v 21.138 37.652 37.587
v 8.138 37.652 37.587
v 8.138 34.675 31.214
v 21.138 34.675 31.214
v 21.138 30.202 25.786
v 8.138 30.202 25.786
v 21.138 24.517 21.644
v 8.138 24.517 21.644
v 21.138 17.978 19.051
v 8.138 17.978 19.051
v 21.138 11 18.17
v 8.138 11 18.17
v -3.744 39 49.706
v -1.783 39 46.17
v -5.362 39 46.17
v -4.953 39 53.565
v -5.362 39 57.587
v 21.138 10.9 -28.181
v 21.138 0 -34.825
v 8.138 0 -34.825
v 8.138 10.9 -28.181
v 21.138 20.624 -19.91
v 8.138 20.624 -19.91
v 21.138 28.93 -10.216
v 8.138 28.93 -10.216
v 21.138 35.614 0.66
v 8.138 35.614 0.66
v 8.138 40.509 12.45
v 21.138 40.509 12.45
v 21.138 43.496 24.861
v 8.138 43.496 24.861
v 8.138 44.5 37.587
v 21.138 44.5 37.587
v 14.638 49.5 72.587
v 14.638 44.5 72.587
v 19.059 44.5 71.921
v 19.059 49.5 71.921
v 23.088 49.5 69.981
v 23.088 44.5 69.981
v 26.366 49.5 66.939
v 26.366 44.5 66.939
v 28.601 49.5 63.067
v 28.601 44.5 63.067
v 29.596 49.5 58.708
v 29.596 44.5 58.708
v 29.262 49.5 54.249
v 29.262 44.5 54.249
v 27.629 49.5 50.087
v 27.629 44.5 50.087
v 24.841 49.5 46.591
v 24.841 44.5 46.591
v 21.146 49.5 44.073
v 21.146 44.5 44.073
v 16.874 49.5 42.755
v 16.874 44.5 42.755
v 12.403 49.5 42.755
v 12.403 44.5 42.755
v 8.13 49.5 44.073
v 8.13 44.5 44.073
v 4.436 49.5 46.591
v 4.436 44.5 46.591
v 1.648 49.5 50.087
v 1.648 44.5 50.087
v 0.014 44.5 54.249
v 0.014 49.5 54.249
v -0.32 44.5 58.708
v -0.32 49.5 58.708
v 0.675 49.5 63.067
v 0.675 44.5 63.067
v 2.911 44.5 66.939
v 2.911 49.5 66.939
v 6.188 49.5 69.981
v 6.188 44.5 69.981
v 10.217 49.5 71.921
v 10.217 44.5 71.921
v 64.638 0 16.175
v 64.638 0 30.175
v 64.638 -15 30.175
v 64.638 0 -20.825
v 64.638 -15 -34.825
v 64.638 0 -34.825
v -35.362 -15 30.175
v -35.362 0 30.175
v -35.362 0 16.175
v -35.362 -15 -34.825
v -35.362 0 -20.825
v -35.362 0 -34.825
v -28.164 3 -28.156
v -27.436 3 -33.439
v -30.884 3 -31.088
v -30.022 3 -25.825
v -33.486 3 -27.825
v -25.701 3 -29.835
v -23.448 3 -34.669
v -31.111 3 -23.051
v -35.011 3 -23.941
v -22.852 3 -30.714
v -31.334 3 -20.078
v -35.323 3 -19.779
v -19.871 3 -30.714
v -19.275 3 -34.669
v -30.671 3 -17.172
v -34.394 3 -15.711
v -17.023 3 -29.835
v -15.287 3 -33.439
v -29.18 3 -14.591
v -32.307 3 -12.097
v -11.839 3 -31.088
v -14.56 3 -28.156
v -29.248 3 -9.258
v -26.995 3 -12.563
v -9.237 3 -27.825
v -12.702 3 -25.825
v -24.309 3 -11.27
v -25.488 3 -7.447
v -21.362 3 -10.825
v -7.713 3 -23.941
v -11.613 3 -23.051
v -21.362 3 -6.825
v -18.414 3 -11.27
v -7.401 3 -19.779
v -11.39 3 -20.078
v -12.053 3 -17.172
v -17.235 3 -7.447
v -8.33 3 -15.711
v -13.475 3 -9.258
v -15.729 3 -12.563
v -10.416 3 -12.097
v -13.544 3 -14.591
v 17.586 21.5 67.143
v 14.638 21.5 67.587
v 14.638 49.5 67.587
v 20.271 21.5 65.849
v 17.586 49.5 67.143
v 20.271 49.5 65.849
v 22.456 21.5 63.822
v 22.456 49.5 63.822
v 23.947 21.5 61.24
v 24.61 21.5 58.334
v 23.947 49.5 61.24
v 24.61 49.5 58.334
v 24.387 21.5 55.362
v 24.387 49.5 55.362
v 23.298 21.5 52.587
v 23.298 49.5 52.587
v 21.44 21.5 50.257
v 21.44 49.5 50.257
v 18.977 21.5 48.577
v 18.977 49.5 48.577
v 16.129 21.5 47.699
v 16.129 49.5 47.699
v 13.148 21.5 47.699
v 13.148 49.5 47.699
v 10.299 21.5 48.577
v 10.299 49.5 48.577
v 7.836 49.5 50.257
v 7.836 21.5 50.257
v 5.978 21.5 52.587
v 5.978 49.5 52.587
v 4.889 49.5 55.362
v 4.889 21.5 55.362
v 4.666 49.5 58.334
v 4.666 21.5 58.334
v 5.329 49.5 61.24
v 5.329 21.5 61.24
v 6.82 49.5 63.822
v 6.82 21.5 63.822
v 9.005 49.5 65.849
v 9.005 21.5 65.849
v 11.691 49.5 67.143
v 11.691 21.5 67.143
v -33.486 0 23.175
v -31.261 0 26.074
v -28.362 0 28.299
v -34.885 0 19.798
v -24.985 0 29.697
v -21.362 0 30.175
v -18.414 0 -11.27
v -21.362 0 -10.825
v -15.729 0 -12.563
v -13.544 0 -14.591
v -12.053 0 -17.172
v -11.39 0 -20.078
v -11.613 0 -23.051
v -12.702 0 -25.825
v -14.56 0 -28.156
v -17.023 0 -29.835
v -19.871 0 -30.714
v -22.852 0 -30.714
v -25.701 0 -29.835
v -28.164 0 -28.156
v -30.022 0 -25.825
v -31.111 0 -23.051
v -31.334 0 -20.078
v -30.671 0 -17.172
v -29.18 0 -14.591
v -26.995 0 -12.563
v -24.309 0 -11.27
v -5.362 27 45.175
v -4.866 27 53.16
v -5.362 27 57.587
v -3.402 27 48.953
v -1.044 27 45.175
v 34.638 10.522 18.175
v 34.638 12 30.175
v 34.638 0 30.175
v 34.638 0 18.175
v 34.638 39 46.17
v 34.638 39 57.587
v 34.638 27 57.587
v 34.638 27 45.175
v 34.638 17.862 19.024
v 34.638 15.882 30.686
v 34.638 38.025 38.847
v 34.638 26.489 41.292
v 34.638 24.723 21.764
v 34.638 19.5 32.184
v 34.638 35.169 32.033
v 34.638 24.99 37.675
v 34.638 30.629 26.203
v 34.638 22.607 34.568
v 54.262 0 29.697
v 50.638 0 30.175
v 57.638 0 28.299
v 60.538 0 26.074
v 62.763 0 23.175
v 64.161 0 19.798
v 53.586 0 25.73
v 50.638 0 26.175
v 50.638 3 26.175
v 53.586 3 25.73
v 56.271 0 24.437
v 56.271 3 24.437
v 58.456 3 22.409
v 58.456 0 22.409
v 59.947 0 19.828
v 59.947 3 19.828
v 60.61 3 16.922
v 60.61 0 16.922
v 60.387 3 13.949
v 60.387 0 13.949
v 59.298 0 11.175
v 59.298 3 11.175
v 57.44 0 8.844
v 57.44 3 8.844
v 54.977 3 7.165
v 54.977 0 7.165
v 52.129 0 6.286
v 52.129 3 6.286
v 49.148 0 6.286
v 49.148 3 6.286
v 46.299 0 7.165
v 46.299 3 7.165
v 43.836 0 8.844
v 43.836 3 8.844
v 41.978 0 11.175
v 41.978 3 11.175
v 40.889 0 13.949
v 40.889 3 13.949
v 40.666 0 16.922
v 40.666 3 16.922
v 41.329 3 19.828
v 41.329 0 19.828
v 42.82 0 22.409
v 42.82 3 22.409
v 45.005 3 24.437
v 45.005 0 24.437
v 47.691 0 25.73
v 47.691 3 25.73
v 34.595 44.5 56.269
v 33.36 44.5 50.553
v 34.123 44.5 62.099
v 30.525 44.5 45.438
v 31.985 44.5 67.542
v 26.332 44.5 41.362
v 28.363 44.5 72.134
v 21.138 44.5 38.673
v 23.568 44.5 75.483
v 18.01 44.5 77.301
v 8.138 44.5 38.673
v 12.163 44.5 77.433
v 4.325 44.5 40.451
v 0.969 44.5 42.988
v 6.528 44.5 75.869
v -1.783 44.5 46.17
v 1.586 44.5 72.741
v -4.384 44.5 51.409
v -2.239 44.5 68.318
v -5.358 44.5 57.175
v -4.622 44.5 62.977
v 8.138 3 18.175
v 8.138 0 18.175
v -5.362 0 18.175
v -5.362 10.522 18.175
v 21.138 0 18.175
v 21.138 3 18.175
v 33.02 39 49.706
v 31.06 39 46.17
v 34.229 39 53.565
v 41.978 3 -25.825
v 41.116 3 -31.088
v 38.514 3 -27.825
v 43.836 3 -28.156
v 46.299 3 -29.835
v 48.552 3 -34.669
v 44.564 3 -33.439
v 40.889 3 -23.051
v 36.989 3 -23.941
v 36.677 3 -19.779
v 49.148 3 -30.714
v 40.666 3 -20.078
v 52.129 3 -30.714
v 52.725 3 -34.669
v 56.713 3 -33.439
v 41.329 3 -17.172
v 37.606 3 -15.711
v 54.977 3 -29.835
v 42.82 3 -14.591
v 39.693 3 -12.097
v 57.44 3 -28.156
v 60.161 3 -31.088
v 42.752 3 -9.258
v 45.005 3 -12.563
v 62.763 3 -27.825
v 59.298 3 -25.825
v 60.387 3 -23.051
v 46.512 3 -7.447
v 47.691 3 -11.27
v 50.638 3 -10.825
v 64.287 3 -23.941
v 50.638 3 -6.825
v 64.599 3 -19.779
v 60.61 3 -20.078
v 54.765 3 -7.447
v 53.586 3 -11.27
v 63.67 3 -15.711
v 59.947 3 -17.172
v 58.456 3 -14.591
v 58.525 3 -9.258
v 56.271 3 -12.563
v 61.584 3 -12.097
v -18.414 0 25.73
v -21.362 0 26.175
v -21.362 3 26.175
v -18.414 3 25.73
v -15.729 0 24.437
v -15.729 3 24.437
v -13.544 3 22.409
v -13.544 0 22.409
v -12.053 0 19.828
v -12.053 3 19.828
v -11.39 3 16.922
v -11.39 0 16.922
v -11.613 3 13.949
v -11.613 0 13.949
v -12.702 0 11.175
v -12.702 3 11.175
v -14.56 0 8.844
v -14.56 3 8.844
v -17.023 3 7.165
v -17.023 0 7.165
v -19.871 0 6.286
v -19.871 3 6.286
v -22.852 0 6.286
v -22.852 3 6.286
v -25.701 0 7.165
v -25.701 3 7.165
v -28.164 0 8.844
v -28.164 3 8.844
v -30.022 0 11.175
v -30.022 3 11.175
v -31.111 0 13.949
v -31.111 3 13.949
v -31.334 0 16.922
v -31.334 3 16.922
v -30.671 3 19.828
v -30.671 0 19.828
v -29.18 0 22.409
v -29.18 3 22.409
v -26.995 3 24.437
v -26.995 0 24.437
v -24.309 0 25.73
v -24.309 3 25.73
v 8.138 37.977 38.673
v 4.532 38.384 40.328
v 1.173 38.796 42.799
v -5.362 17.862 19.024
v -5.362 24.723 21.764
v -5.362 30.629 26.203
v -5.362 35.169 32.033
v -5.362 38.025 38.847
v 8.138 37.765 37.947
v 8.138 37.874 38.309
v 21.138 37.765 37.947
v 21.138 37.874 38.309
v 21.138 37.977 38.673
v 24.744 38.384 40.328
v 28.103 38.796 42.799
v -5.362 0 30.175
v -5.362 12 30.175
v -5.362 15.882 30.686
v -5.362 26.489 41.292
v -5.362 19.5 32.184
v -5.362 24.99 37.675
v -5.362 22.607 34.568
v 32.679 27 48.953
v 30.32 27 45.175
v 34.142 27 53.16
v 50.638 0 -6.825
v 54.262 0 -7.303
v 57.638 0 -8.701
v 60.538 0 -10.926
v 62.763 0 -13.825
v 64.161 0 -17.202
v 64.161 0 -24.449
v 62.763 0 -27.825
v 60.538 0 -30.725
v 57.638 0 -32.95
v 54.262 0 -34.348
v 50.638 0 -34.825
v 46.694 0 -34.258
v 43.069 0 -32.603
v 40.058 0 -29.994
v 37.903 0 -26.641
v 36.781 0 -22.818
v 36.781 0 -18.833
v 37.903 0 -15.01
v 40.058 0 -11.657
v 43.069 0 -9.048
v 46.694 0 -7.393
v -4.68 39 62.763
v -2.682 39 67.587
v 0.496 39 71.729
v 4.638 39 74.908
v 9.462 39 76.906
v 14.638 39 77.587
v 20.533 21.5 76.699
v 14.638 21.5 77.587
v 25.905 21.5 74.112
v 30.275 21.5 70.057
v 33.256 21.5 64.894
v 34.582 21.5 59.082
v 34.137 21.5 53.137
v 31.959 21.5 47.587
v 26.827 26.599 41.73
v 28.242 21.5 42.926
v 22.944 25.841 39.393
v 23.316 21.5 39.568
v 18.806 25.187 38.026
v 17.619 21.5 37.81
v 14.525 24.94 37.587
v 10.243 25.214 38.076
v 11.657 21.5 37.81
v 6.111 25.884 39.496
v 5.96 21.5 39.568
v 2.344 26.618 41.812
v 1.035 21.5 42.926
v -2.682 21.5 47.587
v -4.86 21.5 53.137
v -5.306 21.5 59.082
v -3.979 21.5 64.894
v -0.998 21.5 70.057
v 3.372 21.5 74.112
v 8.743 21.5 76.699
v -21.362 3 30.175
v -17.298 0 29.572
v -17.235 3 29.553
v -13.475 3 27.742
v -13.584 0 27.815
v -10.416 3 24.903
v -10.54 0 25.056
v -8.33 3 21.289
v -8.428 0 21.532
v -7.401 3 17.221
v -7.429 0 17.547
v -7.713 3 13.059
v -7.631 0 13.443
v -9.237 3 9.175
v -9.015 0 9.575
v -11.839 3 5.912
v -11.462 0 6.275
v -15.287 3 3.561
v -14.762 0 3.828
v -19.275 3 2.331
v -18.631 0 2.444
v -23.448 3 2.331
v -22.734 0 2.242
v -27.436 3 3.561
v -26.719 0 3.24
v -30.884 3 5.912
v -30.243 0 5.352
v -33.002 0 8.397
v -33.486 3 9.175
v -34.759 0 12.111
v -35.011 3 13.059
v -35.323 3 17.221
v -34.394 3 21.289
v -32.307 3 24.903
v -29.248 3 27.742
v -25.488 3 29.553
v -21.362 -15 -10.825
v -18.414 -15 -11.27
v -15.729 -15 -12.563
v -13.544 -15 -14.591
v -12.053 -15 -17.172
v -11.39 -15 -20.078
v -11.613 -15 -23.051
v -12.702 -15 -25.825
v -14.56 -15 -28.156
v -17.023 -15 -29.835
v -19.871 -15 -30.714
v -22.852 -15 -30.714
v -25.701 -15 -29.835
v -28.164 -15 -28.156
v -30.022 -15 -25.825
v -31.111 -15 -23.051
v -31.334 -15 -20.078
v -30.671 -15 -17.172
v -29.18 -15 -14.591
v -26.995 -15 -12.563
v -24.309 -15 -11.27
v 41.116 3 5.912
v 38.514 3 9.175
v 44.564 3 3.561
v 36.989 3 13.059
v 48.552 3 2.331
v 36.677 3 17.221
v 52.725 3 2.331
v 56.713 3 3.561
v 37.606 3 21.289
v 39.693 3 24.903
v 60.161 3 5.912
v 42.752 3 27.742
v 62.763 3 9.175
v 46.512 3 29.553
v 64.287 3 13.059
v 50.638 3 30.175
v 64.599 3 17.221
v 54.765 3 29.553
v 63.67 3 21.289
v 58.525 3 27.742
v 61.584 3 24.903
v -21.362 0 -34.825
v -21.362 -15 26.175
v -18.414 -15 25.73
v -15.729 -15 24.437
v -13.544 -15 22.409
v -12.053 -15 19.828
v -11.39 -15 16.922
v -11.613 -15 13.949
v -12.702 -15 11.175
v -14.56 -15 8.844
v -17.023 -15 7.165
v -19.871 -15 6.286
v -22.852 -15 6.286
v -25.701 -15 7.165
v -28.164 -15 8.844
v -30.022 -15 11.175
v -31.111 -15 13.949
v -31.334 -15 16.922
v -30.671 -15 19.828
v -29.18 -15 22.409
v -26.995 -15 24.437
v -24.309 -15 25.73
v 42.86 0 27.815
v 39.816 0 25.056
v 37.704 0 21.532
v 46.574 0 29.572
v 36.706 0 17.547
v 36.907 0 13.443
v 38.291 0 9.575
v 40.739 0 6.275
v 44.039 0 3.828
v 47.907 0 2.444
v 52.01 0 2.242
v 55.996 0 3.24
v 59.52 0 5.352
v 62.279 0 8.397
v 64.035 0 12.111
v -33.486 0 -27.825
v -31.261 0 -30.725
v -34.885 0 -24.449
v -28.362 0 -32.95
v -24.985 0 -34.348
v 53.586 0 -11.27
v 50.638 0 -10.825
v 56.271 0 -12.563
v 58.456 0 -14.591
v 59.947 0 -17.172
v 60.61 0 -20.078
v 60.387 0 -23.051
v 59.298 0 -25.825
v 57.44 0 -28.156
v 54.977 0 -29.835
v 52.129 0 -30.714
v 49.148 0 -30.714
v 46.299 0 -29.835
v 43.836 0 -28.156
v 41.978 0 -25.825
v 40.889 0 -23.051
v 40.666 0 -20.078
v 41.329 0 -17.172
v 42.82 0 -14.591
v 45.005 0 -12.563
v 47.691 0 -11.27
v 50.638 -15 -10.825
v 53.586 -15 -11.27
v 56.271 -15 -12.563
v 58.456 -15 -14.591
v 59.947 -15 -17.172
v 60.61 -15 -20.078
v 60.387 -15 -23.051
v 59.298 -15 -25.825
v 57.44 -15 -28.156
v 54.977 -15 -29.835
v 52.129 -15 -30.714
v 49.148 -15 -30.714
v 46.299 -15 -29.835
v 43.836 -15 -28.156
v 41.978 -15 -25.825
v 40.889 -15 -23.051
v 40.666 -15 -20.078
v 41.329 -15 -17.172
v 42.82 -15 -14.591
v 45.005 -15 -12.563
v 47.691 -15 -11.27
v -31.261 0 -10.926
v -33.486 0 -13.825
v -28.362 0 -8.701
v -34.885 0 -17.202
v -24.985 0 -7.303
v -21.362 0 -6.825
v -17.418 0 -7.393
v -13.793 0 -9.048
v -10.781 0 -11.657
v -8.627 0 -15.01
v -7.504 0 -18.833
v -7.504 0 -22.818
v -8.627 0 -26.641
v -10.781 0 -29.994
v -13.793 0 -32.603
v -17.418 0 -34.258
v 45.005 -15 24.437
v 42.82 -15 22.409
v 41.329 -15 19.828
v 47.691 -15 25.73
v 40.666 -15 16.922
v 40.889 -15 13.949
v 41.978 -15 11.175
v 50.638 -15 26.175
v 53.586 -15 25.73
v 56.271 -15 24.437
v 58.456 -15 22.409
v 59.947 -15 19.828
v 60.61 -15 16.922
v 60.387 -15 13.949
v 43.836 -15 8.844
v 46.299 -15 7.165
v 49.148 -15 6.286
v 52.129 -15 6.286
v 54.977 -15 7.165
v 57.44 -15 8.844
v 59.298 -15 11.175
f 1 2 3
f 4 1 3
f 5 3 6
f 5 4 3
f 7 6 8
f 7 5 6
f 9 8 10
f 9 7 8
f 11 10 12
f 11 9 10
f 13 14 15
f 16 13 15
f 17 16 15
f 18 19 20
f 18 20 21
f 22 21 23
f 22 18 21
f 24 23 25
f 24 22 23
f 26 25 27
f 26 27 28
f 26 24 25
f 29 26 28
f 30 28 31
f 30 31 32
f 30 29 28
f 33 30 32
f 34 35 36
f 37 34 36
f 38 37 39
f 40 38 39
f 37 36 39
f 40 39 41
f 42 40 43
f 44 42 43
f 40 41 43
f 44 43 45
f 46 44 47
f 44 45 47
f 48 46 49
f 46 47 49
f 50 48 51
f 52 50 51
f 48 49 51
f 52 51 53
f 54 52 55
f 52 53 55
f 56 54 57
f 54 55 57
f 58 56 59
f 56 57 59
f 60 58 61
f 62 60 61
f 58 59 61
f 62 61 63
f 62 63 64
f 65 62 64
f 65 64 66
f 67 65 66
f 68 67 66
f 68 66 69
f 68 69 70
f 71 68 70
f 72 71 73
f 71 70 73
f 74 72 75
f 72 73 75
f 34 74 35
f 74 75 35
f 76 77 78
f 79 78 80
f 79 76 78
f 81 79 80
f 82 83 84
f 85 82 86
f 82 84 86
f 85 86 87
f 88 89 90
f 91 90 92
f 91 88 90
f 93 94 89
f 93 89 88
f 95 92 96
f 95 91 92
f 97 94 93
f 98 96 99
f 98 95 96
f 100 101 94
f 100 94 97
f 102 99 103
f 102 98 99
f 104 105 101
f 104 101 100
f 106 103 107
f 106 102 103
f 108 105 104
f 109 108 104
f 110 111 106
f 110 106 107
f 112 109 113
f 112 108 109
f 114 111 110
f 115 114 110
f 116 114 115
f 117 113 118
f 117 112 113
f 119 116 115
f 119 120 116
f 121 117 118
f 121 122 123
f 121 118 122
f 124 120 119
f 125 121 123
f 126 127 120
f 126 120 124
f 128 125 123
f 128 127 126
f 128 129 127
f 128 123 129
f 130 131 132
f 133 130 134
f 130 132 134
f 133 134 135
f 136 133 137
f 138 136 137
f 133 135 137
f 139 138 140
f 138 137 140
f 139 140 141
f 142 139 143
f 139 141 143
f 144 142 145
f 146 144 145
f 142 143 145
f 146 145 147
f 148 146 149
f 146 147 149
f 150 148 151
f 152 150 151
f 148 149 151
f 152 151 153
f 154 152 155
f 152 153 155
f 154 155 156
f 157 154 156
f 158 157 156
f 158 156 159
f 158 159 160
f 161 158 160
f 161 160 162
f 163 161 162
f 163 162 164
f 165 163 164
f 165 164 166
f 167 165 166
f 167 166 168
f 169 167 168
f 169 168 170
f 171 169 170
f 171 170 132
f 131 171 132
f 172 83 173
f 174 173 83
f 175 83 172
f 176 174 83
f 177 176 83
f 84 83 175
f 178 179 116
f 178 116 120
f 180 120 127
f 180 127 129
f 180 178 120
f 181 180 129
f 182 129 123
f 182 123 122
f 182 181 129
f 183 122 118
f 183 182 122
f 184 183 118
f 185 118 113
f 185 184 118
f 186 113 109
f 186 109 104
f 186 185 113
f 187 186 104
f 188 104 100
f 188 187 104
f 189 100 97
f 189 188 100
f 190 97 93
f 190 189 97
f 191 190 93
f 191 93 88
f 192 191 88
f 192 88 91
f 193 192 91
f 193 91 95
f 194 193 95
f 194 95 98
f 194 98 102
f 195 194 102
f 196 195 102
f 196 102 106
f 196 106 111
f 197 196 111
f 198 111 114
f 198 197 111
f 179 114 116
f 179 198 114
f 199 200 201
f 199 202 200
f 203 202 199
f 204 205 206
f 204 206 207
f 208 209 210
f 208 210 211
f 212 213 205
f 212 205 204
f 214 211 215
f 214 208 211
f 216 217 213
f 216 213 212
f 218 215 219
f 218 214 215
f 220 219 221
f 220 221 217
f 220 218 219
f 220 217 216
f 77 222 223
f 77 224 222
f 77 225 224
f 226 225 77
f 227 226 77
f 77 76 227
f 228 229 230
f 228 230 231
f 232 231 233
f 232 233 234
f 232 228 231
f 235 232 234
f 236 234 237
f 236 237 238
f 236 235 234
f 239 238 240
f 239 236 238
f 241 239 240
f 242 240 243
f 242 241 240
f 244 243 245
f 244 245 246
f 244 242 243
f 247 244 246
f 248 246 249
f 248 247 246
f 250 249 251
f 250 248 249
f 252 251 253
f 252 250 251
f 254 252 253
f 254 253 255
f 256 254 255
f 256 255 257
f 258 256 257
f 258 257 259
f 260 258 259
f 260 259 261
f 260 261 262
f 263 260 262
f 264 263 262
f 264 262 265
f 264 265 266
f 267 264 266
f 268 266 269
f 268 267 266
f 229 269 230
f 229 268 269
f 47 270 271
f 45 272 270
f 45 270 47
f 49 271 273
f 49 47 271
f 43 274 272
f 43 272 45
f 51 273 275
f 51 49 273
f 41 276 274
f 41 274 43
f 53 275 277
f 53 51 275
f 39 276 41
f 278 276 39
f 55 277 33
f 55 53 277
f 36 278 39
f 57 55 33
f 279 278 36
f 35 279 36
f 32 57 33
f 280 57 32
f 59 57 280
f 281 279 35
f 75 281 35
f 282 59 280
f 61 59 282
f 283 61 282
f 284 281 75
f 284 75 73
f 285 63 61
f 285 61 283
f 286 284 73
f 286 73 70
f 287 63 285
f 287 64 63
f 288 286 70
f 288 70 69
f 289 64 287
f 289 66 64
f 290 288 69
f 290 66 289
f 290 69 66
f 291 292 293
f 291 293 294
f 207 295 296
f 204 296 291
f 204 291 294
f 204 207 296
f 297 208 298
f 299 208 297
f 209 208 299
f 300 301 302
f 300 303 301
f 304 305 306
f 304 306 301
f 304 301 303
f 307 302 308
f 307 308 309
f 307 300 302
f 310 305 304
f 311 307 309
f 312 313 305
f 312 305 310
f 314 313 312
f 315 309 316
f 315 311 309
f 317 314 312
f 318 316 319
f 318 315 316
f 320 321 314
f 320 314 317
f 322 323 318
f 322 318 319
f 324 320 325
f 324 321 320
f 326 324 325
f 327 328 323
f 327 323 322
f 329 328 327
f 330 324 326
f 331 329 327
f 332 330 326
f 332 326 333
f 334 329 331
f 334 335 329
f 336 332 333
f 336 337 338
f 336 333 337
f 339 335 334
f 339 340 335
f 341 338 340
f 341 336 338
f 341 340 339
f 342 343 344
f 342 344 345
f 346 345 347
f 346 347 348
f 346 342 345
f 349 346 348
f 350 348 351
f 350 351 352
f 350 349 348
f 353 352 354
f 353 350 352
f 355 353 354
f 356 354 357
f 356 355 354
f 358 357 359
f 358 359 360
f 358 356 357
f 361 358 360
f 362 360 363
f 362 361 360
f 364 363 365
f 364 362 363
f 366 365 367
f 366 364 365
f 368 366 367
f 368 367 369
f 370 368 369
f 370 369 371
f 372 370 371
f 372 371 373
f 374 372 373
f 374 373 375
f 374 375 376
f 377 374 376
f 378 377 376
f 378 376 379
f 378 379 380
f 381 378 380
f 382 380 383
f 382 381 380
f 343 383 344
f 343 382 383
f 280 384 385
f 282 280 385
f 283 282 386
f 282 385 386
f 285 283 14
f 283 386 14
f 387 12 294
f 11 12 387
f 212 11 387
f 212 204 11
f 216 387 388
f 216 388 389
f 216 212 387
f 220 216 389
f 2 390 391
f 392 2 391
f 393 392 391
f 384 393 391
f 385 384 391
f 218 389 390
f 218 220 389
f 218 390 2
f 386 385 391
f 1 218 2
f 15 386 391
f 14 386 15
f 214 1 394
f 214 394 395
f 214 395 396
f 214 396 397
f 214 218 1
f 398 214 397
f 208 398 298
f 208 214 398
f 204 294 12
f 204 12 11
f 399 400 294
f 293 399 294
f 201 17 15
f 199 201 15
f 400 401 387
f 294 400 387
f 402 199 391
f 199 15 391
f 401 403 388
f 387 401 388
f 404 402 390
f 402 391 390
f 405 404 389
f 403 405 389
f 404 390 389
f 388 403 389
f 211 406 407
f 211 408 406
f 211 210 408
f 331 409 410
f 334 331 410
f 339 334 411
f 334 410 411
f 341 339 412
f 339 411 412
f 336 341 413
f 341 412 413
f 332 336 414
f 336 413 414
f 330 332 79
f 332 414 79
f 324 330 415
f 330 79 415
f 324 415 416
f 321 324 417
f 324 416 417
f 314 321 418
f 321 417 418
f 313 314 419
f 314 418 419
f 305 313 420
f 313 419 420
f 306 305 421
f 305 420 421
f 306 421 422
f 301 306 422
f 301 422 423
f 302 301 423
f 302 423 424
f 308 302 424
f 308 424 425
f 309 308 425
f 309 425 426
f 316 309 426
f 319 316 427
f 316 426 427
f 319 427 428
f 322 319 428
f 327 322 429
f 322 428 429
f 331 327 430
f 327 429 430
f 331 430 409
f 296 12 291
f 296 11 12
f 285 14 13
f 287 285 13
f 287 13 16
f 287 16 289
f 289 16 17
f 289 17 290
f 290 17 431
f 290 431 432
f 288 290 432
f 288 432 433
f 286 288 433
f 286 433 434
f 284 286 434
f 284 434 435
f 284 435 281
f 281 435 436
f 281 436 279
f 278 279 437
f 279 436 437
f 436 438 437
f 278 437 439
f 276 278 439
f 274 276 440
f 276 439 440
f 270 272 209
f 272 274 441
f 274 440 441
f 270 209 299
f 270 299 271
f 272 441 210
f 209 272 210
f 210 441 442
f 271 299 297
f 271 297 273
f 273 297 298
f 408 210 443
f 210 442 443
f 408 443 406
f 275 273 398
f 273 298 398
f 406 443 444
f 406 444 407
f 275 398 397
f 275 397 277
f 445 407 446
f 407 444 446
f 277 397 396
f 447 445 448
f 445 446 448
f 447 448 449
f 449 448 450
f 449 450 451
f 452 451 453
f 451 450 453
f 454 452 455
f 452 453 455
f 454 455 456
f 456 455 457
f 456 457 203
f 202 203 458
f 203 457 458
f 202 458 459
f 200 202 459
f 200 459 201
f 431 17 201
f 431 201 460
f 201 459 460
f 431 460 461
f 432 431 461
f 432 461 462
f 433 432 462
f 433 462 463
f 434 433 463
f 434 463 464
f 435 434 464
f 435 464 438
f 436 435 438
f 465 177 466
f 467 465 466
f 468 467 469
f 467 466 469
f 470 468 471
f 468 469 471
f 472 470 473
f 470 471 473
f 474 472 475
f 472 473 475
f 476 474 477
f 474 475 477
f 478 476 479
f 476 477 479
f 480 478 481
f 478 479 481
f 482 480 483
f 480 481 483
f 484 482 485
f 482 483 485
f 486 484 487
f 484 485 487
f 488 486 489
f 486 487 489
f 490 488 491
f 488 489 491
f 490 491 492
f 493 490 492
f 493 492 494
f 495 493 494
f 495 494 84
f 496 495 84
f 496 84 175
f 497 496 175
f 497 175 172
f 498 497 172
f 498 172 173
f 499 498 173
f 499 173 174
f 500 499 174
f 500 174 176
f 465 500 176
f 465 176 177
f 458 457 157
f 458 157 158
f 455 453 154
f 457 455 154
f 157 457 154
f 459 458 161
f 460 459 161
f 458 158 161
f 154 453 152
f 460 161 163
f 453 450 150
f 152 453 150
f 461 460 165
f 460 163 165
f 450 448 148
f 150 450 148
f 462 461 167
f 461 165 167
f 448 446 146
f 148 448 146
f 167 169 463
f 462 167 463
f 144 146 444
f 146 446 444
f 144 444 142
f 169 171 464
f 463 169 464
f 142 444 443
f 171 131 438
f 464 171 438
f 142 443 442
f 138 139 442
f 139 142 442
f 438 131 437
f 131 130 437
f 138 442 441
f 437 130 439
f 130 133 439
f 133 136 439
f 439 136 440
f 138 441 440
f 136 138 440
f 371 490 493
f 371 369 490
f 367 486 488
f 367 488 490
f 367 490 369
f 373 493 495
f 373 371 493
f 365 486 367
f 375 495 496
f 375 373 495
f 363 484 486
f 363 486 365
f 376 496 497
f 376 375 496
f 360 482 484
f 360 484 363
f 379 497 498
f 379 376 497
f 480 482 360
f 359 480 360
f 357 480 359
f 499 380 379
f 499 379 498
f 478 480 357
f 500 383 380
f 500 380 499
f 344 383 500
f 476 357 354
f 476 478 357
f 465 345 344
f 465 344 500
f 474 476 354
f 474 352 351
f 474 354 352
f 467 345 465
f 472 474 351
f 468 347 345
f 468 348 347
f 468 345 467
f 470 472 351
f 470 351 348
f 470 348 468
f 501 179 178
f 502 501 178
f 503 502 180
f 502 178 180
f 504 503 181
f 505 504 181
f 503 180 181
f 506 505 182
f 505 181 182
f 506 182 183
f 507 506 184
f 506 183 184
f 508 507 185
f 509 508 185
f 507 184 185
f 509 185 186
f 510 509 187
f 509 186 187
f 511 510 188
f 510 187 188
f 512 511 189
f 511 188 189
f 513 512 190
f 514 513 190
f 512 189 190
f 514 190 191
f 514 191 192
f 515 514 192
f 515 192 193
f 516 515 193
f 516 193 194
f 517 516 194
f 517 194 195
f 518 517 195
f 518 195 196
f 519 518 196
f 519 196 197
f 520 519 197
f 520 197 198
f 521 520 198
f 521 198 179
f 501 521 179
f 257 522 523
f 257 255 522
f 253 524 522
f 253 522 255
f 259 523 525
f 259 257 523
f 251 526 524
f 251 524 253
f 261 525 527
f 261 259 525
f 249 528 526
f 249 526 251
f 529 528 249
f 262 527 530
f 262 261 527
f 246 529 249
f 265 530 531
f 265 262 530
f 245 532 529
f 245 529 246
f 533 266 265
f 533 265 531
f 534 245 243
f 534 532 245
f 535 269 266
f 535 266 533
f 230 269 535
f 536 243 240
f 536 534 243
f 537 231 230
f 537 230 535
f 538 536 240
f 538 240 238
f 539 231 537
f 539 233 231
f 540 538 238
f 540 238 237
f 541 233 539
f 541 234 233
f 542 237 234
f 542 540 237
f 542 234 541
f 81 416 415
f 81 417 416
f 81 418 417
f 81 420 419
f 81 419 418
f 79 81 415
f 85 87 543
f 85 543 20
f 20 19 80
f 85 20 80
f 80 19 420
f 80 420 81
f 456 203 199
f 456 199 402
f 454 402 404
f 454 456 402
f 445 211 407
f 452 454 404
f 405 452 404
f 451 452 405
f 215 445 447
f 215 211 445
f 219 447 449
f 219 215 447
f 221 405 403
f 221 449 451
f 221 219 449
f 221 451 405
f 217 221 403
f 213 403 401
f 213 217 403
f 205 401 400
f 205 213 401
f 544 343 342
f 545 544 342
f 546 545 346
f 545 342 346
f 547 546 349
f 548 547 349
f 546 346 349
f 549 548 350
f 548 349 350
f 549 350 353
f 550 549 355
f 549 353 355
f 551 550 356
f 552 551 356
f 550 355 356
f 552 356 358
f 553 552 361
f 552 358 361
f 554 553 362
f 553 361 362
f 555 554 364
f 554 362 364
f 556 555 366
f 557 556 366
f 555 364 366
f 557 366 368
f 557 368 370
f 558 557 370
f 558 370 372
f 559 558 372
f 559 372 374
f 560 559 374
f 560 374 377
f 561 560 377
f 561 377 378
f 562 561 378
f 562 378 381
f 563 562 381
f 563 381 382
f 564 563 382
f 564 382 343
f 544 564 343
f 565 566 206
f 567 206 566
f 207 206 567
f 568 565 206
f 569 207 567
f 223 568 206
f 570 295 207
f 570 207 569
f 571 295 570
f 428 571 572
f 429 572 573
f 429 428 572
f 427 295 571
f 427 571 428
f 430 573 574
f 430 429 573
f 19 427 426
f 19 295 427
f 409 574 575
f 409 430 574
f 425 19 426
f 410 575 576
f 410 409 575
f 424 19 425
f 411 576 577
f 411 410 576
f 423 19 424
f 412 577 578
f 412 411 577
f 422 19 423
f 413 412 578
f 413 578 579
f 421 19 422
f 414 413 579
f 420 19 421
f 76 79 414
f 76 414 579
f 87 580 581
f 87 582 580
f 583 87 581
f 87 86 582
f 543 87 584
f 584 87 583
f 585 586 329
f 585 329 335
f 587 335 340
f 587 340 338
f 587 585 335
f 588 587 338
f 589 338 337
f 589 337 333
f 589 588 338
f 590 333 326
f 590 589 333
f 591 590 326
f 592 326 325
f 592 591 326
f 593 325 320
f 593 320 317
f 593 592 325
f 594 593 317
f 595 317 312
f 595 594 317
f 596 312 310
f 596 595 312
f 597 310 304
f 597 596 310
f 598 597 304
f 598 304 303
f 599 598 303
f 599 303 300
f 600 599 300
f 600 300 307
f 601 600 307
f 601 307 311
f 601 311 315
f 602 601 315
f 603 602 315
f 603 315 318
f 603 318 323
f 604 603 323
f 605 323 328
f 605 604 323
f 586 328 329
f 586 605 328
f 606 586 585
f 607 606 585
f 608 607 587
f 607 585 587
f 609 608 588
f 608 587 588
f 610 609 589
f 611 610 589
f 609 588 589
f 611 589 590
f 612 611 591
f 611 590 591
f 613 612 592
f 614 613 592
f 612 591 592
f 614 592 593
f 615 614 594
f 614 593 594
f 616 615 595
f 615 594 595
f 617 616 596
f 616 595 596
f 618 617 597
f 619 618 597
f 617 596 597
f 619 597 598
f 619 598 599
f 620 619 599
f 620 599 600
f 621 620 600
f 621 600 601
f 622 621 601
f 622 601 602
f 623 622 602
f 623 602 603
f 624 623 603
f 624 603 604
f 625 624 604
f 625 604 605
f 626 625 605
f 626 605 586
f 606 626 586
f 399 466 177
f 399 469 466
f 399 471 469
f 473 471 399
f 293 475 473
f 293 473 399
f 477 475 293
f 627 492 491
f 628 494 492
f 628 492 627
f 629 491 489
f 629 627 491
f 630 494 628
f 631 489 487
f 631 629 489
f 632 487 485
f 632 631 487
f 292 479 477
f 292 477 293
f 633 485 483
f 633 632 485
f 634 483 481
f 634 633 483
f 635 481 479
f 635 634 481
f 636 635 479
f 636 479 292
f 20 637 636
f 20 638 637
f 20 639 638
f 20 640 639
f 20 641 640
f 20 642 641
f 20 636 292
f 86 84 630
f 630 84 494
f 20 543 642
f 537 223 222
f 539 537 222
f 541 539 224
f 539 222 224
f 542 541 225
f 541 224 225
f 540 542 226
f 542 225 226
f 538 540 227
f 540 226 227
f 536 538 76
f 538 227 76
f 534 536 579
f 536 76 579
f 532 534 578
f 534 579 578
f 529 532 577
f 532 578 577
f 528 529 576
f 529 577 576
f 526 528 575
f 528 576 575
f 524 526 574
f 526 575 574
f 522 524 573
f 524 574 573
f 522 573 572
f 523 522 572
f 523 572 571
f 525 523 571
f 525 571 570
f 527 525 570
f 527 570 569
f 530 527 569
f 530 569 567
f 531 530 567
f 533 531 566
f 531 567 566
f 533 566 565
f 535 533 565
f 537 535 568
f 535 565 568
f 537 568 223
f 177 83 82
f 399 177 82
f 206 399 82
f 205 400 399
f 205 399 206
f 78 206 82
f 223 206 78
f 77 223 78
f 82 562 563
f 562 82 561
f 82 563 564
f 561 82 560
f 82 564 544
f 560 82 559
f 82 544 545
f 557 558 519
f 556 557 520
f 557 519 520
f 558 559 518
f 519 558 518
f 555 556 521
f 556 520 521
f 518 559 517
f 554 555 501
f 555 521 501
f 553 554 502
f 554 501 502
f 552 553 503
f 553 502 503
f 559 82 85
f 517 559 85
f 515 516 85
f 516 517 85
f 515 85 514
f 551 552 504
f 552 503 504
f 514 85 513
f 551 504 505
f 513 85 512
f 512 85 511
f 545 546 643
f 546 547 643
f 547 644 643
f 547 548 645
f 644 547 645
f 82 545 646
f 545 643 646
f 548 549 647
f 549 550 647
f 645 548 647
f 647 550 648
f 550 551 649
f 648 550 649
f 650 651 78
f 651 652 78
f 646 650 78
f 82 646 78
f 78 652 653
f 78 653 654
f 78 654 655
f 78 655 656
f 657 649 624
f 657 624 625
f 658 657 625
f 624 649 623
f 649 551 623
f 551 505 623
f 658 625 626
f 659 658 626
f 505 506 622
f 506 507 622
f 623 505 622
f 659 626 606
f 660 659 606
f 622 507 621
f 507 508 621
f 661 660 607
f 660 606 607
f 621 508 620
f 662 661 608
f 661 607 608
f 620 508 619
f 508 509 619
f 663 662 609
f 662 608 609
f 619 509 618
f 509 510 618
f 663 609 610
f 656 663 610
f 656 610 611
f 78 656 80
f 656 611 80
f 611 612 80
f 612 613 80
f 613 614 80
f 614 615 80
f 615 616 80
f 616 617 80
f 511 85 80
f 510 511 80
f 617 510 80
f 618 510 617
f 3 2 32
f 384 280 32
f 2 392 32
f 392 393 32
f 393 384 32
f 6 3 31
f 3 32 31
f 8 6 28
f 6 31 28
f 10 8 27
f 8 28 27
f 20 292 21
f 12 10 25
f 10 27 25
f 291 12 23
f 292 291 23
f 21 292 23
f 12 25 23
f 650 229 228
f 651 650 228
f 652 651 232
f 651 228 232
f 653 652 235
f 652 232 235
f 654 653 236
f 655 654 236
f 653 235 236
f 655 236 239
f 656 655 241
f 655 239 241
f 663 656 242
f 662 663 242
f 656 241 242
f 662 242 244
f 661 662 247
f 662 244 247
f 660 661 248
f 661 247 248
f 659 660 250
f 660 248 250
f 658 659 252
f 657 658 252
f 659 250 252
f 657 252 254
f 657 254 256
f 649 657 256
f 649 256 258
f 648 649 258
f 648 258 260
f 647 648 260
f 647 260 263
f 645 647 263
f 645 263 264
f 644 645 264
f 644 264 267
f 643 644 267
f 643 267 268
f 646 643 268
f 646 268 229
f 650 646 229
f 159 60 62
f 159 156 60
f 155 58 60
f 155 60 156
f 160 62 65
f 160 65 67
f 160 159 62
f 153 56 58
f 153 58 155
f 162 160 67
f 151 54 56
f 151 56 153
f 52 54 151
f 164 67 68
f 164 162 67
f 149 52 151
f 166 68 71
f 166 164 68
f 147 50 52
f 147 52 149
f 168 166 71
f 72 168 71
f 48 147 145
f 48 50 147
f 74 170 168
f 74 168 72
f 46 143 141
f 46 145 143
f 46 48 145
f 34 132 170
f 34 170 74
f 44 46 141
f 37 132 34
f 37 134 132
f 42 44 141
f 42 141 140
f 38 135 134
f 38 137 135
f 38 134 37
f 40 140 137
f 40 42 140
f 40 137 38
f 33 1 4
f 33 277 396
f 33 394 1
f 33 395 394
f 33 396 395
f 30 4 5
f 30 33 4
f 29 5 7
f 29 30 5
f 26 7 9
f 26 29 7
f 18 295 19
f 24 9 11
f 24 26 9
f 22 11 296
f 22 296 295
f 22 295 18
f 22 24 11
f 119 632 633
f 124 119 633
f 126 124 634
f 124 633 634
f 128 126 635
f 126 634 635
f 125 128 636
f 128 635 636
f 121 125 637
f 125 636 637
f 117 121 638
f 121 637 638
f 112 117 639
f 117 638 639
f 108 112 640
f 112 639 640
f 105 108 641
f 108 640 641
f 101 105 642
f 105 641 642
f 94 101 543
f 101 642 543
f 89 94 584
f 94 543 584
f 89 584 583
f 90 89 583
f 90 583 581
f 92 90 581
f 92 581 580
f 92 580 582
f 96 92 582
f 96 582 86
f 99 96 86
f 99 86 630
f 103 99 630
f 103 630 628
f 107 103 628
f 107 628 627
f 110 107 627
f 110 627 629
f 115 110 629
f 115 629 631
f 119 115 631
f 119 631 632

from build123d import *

# Parameters (mm, degrees)
SKETCH1_R             = 14
SKETCH1_R_2           = 10
BOSS_EXTRUDE2_DEPTH   = 3
BOSS_EXTRUDE2_2_DEPTH = 3
BOSS_EXTRUDE2_3_DEPTH = 3
BOSS_EXTRUDE2_4_DEPTH = 3
SKETCH2_W             = 100
SKETCH2_H             = 65
BOSS_EXTRUDE3_DEPTH   = 15
BOSS_EXTRUDE4_DEPTH   = 20
SKETCH4_R             = 20
BOSS_EXTRUDE5_DEPTH   = 5.5
BOSS_EXTRUDE6_START   = -23
SKETCH5_R             = 20
BOSS_EXTRUDE6_DEPTH   = 23
SKETCH6_R             = 15
BOSS_EXTRUDE7_DEPTH   = 5
SKETCH7_R             = 10
CUT_EXTRUDE1_DEPTH    = 120.825265291
BOSS_EXTRUDE8_DEPTH   = 6.5
SKETCH13_R            = 10
CUT_EXTRUDE2_DEPTH    = 113.463746168


with BuildPart() as part:
    # Sketch1 → Boss-Extrude2 (new body)
    with BuildSketch(Plane(origin=(0, 0, 0), x_dir=(1, 0, 0), z_dir=(0, 1, 0))):
        with Locations(Location((50.63816244, 20.825493171, 0), (0, 0, 270))):
            Circle(SKETCH1_R)
        with Locations(Location((50.63816244, 20.825493171, 0), (0, 0, 270))):
            Circle(SKETCH1_R_2, mode=Mode.SUBTRACT)
    extrude(amount=BOSS_EXTRUDE2_DEPTH)



with BuildPart() as body_2:
    # Sketch1 → Boss-Extrude2 2 (new body)
    with BuildSketch(Plane(origin=(0, 0, 0), x_dir=(1, 0, 0), z_dir=(0, 1, 0))):
        with Locations(Location((50.63816244, -16.174506829, 0), (0, 0, 270))):
            Circle(SKETCH1_R)
        with Locations(Location((50.63816244, -16.174506829, 0), (0, 0, 270))):
            Circle(SKETCH1_R_2, mode=Mode.SUBTRACT)
    extrude(amount=BOSS_EXTRUDE2_2_DEPTH)


with BuildPart() as body_3:
    # Sketch1 → Boss-Extrude2 3 (new body)
    with BuildSketch(Plane(origin=(0, 0, 0), x_dir=(1, 0, 0), z_dir=(0, 1, 0))):
        with Locations(Location((-21.36183756, 20.825493171, 0), (0, 0, 270))):
            Circle(SKETCH1_R)
        with Locations(Location((-21.36183756, 20.825493171, 0), (0, 0, 270))):
            Circle(SKETCH1_R_2, mode=Mode.SUBTRACT)
    extrude(amount=BOSS_EXTRUDE2_3_DEPTH)


with BuildPart() as body_4:
    # Sketch1 → Boss-Extrude2 4 (new body)
    with BuildSketch(Plane(origin=(0, 0, 0), x_dir=(1, 0, 0), z_dir=(0, 1, 0))):
        with Locations(Location((-21.36183756, -16.174506829, 0), (0, 0, 270))):
            Circle(SKETCH1_R)
        with Locations(Location((-21.36183756, -16.174506829, 0), (0, 0, 270))):
            Circle(SKETCH1_R_2, mode=Mode.SUBTRACT)
    extrude(amount=BOSS_EXTRUDE2_4_DEPTH)


with BuildPart() as part_1:
    add(part.part)

    add(body_2.part)  # Boss-Extrude3 merges body 2

    add(body_3.part)  # Boss-Extrude3 merges body 3

    add(body_4.part)  # Boss-Extrude3 merges body 4
    # Sketch2 → Boss-Extrude3 (add)
    with BuildSketch(Plane(origin=(0, 0, 0), x_dir=(1, 0, 0), z_dir=(0, 1, 0))):
        with Locations((14.63816244, 2.325493171)):
            Rectangle(SKETCH2_W, SKETCH2_H)
    extrude(amount=-BOSS_EXTRUDE3_DEPTH)

    # Sketch3 → Boss-Extrude4 (add, symmetric)
    with BuildSketch(Plane(origin=(14.63816244, 0, 0), x_dir=(0, 0, -1), z_dir=(1, 0, 0))):
        with BuildLine():
            Line((-30.174506829, 12), (-30.174506829, 0))
            Line((-30.174506829, 0), (-18.174506829, 0))
            Line((-18.174506829, 0), (-18.174506829, 10.52211824))
            ThreePointArc((-18.174506829, 10.52211824), (-26.203196706, 30.629306034), (-46.170428478, 39))
            Line((-46.170428478, 39), (-57.587061699, 39))
            Line((-57.587061699, 39), (-57.587061699, 27))
            Line((-57.587061699, 27), (-45.174506829, 27))
            ThreePointArc((-45.174506829, 27), (-34.567905111, 22.606601718), (-30.174506829, 12))
        make_face()
    extrude(amount=BOSS_EXTRUDE4_DEPTH, both=True)

    # Sketch4 → Boss-Extrude5 (add)
    with BuildSketch(Plane(origin=(0, 39, 0), x_dir=(1, 0, 0), z_dir=(0, 1, 0))):
        with Locations(Location((14.63816244, -57.587061699, 0), (0, 0, 145.191759612))):
            Circle(SKETCH4_R)
    extrude(amount=BOSS_EXTRUDE5_DEPTH)

    # Sketch5 → Boss-Extrude6 (add)
    with BuildSketch(Plane(origin=(0, 44.5, 0), x_dir=(1, 0, 0), z_dir=(0, 1, 0)).offset(BOSS_EXTRUDE6_START)):
        with Locations(Location((14.63816244, -57.587061699, 0), (0, 0, 270))):
            Circle(SKETCH5_R)
    extrude(amount=BOSS_EXTRUDE6_DEPTH)

    # Sketch6 → Boss-Extrude7 (add)
    with BuildSketch(Plane(origin=(0, 44.5, 0), x_dir=(1, 0, 0), z_dir=(0, 1, 0))):
        with Locations(Location((14.63816244, -57.587061699, 0), (0, 0, 270))):
            Circle(SKETCH6_R)
    extrude(amount=BOSS_EXTRUDE7_DEPTH)

    # Sketch7 → Cut-Extrude1 (cut, through all)
    with BuildSketch(Plane(origin=(0, 49.5, 0), x_dir=(1, 0, 0), z_dir=(0, 1, 0))):
        with Locations(Location((14.63816244, -57.587061699, 0), (0, 0, 270))):
            Circle(SKETCH7_R)
    extrude(amount=-CUT_EXTRUDE1_DEPTH, mode=Mode.SUBTRACT)


with BuildPart() as boss_extrude8_tool:
    # Sketch12 → Boss-Extrude8 (new, symmetric)
    with BuildSketch(Plane(origin=(14.63816244, 0, 0), x_dir=(0, 0, -1), z_dir=(1, 0, 0))):
        with BuildLine():
            Line((-18.170428478, 11), (-18.174506829, 3))
            Line((-18.174506829, 3), (-18.174506829, 0))
            Line((-18.174506829, 0), (31.654695104, 0))
            Line((31.654695104, 0), (34.825493171, 0))
            ThreePointArc((34.825493171, 0), (4.909491405, 32.485841169), (-37.587061699, 44.5))
            Line((-37.587061699, 44.5), (-42.002826433, 44.5))
            Line((-42.002826433, 44.5), (-42.002826433, 38.688103821))
            ThreePointArc((-42.002826433, 38.688103821), (-39.774060831, 38.259017893), (-37.587061699, 37.651938292))
            ThreePointArc((-37.587061699, 37.651938292), (-23.535561338, 27.490091956), (-18.170428478, 11))
        make_face()
    extrude(amount=BOSS_EXTRUDE8_DEPTH, both=True)


with BuildPart() as part_2:
    add(part_1.part)


with BuildPart() as part_3:
    # Boss-Extrude8: joined with boss_extrude8_tool
    add(part_2.part.fuse(boss_extrude8_tool.part, tol=0.00001))

    # Sketch13 → Cut-Extrude2 (cut, through all)
    with BuildSketch(Plane(origin=(0, 0, 0), x_dir=(1, 0, 0), z_dir=(0, 1, 0))):
        with Locations(Location((-21.36183756, 20.825493171, 0), (0, 0, 270))):
            Circle(SKETCH13_R)
        with Locations(Location((-21.36183756, -16.174506829, 0), (0, 0, 270))):
            Circle(SKETCH13_R)
        with Locations(Location((50.63816244, 20.825493171, 0), (0, 0, 270))):
            Circle(SKETCH13_R)
        with Locations(Location((50.63816244, -16.174506829, 0), (0, 0, 270))):
            Circle(SKETCH13_R)
    extrude(amount=-CUT_EXTRUDE2_DEPTH, mode=Mode.SUBTRACT)


solid = part_3.part
